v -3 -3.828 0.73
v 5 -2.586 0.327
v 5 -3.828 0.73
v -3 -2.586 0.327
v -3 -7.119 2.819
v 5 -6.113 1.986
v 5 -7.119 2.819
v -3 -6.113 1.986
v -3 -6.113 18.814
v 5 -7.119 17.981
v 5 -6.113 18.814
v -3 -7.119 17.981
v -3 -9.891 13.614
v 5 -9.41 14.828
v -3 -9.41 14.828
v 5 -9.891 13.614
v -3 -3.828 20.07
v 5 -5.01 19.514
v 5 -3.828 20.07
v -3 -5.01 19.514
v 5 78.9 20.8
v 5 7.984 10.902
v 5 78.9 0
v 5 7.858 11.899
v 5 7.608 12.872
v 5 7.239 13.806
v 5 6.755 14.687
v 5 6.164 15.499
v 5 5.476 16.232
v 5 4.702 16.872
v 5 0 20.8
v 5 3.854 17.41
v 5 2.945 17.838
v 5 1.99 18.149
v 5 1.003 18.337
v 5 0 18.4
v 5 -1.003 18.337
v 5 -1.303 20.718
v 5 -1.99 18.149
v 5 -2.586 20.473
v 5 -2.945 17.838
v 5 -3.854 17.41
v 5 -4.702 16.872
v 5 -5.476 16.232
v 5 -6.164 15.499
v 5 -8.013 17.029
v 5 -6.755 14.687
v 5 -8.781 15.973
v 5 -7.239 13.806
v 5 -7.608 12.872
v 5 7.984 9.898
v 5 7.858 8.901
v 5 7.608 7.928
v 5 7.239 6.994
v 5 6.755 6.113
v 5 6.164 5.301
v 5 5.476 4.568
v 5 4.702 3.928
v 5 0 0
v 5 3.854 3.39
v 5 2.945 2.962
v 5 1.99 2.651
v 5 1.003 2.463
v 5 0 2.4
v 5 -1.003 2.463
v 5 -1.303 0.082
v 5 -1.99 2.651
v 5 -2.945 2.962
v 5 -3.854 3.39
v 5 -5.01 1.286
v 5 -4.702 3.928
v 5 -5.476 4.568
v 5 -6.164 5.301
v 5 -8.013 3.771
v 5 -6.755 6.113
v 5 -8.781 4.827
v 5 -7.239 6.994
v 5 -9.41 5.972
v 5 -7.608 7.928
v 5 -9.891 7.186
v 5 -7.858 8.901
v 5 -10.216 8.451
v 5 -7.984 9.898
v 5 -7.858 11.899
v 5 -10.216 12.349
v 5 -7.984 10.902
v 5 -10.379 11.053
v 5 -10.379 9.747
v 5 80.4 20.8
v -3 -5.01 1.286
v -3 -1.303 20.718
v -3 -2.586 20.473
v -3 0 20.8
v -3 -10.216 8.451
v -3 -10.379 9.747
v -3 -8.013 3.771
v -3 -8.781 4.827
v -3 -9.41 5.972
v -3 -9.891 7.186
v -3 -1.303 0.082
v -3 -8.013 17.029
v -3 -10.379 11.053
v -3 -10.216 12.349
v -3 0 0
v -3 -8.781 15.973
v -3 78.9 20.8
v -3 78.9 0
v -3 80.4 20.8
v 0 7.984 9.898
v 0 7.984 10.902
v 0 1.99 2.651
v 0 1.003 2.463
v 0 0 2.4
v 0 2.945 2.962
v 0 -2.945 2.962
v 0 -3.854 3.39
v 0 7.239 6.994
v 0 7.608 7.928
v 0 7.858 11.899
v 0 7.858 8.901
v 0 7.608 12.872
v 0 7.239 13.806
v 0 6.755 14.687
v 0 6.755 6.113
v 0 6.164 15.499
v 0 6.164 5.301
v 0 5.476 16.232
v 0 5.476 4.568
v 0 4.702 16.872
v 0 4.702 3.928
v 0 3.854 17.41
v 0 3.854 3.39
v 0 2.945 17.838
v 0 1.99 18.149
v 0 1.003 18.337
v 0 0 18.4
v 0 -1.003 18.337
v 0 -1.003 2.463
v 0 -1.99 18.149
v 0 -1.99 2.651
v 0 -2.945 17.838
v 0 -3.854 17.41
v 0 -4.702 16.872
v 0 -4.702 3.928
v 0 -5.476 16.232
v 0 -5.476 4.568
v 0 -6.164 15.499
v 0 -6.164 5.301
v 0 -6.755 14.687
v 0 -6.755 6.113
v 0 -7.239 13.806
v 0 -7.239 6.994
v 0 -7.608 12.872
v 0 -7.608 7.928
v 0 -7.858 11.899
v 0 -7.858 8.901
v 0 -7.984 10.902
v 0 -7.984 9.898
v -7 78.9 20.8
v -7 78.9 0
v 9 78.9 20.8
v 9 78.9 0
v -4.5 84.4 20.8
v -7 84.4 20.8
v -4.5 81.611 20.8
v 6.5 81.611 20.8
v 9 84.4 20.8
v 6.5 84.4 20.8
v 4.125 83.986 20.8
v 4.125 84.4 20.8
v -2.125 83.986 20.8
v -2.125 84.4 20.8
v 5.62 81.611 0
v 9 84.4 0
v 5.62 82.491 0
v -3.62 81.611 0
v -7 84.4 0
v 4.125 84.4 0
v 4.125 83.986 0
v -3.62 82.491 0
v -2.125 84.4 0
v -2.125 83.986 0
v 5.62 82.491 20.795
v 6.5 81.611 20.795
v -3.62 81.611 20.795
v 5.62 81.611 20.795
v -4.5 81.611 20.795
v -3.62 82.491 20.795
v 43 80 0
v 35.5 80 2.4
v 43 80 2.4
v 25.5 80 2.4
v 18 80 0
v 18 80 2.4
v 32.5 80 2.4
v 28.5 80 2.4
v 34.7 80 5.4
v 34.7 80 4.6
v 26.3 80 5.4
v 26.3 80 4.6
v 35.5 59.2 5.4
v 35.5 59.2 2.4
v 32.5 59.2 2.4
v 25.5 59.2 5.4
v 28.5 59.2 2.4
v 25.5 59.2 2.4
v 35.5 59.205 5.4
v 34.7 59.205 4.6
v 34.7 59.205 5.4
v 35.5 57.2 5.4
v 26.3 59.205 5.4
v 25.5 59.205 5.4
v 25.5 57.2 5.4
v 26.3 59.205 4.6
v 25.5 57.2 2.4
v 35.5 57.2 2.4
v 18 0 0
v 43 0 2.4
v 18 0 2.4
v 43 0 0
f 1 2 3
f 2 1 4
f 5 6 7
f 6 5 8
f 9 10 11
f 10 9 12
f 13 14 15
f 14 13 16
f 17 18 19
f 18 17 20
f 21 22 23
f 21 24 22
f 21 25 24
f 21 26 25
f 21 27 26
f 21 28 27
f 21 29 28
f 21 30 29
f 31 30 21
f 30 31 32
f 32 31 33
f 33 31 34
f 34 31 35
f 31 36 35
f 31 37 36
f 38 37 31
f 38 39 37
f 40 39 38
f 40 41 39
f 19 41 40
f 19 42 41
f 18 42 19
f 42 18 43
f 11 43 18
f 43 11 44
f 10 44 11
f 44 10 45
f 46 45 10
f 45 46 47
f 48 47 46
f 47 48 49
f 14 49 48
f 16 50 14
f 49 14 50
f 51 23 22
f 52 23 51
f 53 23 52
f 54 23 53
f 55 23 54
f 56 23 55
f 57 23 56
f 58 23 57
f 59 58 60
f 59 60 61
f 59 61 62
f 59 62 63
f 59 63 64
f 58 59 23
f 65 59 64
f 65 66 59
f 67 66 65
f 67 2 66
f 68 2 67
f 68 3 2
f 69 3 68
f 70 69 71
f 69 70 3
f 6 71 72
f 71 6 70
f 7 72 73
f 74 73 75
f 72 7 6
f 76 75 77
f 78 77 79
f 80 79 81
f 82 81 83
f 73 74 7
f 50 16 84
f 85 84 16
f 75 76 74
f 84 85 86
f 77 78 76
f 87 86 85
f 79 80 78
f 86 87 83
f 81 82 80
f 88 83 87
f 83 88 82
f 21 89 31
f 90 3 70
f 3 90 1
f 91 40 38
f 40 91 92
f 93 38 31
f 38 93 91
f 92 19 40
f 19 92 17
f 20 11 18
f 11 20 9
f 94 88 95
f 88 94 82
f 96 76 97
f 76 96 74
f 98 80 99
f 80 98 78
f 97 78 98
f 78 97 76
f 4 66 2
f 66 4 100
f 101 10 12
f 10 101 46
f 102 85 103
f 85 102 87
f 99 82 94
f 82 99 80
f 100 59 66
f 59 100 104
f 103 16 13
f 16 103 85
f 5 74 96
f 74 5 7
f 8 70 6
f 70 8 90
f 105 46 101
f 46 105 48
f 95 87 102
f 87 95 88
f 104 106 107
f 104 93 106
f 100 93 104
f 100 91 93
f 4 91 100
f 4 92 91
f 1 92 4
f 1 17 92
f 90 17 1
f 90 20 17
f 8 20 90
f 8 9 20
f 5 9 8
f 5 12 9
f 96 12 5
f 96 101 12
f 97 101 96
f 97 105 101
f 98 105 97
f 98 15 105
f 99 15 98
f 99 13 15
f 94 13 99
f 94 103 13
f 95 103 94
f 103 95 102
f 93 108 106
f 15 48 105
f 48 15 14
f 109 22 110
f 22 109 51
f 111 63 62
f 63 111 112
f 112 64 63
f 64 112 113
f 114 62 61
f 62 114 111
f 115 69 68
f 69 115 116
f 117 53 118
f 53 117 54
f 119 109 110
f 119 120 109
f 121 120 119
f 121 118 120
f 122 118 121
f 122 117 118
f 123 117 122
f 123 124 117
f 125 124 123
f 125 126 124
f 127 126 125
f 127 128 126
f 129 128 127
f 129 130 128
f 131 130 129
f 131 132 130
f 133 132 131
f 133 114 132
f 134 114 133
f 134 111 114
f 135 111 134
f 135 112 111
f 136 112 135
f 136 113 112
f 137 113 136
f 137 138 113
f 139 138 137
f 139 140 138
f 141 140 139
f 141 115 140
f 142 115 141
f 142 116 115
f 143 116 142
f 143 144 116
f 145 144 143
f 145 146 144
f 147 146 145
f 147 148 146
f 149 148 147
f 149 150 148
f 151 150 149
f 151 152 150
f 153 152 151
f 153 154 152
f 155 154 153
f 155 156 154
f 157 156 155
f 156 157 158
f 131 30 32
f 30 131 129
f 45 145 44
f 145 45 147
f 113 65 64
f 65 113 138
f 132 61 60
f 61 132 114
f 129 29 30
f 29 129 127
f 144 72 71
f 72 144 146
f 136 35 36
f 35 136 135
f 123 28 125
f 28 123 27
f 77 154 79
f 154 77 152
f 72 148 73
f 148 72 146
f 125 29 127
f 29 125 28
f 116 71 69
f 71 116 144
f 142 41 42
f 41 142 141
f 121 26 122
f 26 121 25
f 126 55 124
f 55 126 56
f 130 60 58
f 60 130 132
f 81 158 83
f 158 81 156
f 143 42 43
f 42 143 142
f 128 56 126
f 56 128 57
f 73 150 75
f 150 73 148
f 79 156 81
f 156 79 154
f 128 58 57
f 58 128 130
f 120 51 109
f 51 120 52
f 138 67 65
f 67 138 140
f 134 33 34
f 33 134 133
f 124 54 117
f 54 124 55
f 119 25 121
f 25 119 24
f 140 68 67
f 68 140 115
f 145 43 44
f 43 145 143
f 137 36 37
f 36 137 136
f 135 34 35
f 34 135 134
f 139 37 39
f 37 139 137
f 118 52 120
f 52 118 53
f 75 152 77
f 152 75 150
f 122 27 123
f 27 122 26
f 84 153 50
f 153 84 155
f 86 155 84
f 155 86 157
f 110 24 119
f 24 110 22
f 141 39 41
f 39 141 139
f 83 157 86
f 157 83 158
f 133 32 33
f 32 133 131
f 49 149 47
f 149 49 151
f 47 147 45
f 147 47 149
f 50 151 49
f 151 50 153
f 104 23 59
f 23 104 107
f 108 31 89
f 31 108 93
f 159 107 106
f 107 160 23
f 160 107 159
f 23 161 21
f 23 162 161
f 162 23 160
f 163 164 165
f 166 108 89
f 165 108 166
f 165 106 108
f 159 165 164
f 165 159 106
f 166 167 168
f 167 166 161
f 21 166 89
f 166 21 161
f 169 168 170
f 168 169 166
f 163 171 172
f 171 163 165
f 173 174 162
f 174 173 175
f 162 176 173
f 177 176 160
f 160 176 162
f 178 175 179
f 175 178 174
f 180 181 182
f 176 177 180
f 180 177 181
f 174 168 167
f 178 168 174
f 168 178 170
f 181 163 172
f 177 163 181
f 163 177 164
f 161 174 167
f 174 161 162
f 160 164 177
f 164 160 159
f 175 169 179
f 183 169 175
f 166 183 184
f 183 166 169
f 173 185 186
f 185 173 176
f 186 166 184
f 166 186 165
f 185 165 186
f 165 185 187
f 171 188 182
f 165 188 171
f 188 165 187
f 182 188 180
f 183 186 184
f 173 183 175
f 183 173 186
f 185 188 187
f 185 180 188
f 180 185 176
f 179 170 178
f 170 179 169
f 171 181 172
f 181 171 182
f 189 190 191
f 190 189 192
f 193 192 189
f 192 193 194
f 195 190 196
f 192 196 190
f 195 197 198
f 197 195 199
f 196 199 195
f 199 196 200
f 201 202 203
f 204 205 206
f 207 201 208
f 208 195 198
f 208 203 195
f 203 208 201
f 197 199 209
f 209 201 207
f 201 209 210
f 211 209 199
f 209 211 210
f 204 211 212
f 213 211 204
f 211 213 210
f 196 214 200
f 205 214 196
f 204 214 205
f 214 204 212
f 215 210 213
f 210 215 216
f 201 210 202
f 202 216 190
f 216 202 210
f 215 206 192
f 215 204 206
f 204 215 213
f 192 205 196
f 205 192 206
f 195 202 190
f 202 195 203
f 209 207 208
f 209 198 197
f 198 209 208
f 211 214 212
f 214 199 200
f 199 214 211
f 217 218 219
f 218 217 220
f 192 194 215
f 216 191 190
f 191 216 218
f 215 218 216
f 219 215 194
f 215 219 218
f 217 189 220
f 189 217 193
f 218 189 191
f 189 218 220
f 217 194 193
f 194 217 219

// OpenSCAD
use <MCAD/triangles.scad>

/* [What to Print] */
//Do not print this one, for visualization purposes only
visualize_assembly = 0; // [0:false, 1:true]
arm = 1; // [0:false, 1:true]
baseAndLock = 1; // [0:false, 1:true]
//Useful if you want to print the base lock in a different orientation and attach it
baseWithoutLock = 0; // [0:false, 1:true]
//Useful if you want to print the base lock in a different orientation and attach it
lockForBase = 0; // [0:false, 1:true]
//Print the standalone lock parts to make sure they're going to fit together well
lockingTest = 0; // [0:false, 1:true]

/* [Dowel] */
//Dowel diamerter in mm
dowelDia = 16; //mm, 5/8in
//Depth of material (grip) surrounding the dowel circumference
dowelGripD = 2.4;
//Depth of material backing the dowel end
dowelBackD = 3;
//How far the grip will cover the dowel end
dowelDep = 5;

/* [Arm] */
//Length of the arm
armLen = 70;

/* [Base] */
//Height of base
baseH = 80;
//Wdith of base
baseW = 25;
//Depth/thickness of base
baseD = 2.4;

/* [Lock] */
//Height of the right triangles used in the locking mechanism
lockSize = 5;
//Amount of extra wall to surround the locking mechanism
lockWallD = 3;
//How much height of the triangles to cut off for the locking mechanism. Should be about lockSize/2
lockCutoff = 2;
//Height of the stopper on locking mechanism
lockStopH = 2;
//Adjusts the PERCENTAGE (scale) tolerance between the locking pieces. Increase for looser fit.
lockTolerance = 10;
//Amount to trim the sharp dovetail edges; helps locking mechanism slide better
dovetailTrim = .8;

//Don't include things past here in customizer
module blank() {}

$fn = 50;
e = .01;
armDep = dowelDep+dowelBackD;
insetDia = dowelDia + (dowelGripD*2);
lockBackD = 1.2;

module inset() {
    difference() {
        translate([0, 0, -dowelBackD]) cylinder(d=insetDia, h=armDep);;
        cylinder(d=dowelDia, h=50); //cutout
    }
}

module arm() {
    length = armLen+insetDia/2;
    difference() {
        translate([0, length/2, armDep/2-dowelBackD]) cube(size=[insetDia, length, armDep], center=true);
        cylinder(d=insetDia-e, h=50, center=true);
    }
}

module armLock() {
    baseTolerance = 0.5;
    scalar = 1+(lockTolerance/100);
    
    difference() {
        translate([baseTolerance, 0, 0]) union() {
            cube(size=[lockSize-lockCutoff+lockWallD-baseTolerance, lockSize+lockWallD, insetDia], center=false);
            mirror([0, 1, 0]) cube(size=[lockSize-lockCutoff+lockWallD-baseTolerance, lockSize+lockWallD, insetDia], center=false);
        }
        
        //Cutout to slide over the base lock
        scale([scalar, scalar, 1]) translate([lockSize-lockCutoff-e, 0, 0]) mirror([1, 0, 0]) baseLock();
        
        //Truncate the overlap a bit
        color("red") translate([0, 0, insetDia/2+e])  cube(size=[lockSize, lockSize*5/4, insetDia+2*e], center=true);
    }
    
}

module baseLock() {
    trimSize = dovetailTrim*2;
    
    difference() {
        union() {
            triangle(lockSize,lockSize,insetDia);
            mirror([0, 1, 0]) triangle(lockSize,lockSize,insetDia);
            
            //stopper
            translate([lockSize/2, 0, insetDia+(lockStopH)/2]) cube(size=[lockSize, lockSize*2, 2], center=true);
        }
        
        //dovetail cutouts
        translate([lockSize-lockCutoff, -lockSize-e, -e]) cube(size=[(lockSize+e)*2,(lockSize+e)*2,500]);
        
        //Flatten the dovetail edges by 0.5mm
        translate([0, lockSize, insetDia/2-e]) cube(size=[trimSize, trimSize, insetDia+e], center=true);
        translate([0, -lockSize, insetDia/2-e]) cube(size=[trimSize, trimSize, insetDia+e], center=true);
    }
    //backing
    translate([lockSize-lockCutoff, -lockSize, 0]) cube(size=[lockBackD, lockSize*2, insetDia+lockStopH]);
}

module baseWithLock() {
    cube(size=[baseH, baseW, baseD], center=true); //base
    translate([-baseH/2, 0, baseD/2+lockSize-lockCutoff]) rotate([0, 90, 0]) baseLock();
}

module base() {
    difference() {
        cube(size=[baseH, baseW, baseD], center=true); //base
        translate([-baseH/2, 0, baseD/2+lockSize-lockCutoff]) rotate([0, 90, 0]) baseLock();
    }
}

module holder() {
    inset();
    arm();
    //armHook();
    translate([insetDia/2, armLen+insetDia/2+(lockSize-lockCutoff)+lockWallD/2, (dowelDep-dowelBackD)/2]) rotate([90, 0, -90]) armLock();
    //base();
}

module view() {
    rotate([0, 90, 0]) holder();
    
    extraLenSpace = lockSize-lockCutoff+lockWallD/2;
    length = armLen+(insetDia+baseD)/2+extraLenSpace;
    shiftDown = (baseH-insetDia)/2;
    rotate([0, 90, 0]) {
        translate([shiftDown, length, (dowelDep-dowelBackD)/2]) rotate([90,0,0]) {
            baseWithLock();
        }
    }
    //rotate([0, 90, 0]) baseView();
}

module printHolder() {
    rotate([0, 90, 0]) holder();
}

module printBase() {
    translate([0, baseH/2, 0]) rotate([0, 0, -90]) base();
}

//Not nearly as durable as printBase()
module printBaseWithLock() {
    translate([0, baseH/2, 0]) rotate([0, 0, -90]) baseWithLock();
}

module printBaseLock() {
    translate([50, 0, insetDia+lockStopH]) rotate([180, 0, 0]) baseLock();
}

//Print the lock parts separately to make sure they're going to fit
module lockTest() {
    //translate([0, 0, 0]) rotate([0, 90, 0])
    translate([0, 0, lockSize-lockCutoff+lockBackD]) rotate([0, 90, 0])  baseLock();
    translate([-10, 0, 0]) armLock();
}

//Visualize the lock part fitting together (for development)
module lockVisualizer() {
    color("red") translate([lockSize-lockCutoff-e, 0, 0]) mirror([1, 0, 0]) baseLock();
    translate([10, 0, 0]) armLock();
}

if (visualize_assembly) {
    view();
}

if (arm) {
    translate([0, 0, insetDia/2]) printHolder();
}

if (baseAndLock) {
    translate([baseW/2+armDep+10, 0, baseD/2]) printBaseWithLock();
}

if (baseWithoutLock) {
    translate([baseW/2+armDep+10, 0, baseD/2]) printBase();
}

if (lockForBase) {
    printBaseLock();
}

if (lockingTest) {
    lockTest();
}


//lockVisualizer();
